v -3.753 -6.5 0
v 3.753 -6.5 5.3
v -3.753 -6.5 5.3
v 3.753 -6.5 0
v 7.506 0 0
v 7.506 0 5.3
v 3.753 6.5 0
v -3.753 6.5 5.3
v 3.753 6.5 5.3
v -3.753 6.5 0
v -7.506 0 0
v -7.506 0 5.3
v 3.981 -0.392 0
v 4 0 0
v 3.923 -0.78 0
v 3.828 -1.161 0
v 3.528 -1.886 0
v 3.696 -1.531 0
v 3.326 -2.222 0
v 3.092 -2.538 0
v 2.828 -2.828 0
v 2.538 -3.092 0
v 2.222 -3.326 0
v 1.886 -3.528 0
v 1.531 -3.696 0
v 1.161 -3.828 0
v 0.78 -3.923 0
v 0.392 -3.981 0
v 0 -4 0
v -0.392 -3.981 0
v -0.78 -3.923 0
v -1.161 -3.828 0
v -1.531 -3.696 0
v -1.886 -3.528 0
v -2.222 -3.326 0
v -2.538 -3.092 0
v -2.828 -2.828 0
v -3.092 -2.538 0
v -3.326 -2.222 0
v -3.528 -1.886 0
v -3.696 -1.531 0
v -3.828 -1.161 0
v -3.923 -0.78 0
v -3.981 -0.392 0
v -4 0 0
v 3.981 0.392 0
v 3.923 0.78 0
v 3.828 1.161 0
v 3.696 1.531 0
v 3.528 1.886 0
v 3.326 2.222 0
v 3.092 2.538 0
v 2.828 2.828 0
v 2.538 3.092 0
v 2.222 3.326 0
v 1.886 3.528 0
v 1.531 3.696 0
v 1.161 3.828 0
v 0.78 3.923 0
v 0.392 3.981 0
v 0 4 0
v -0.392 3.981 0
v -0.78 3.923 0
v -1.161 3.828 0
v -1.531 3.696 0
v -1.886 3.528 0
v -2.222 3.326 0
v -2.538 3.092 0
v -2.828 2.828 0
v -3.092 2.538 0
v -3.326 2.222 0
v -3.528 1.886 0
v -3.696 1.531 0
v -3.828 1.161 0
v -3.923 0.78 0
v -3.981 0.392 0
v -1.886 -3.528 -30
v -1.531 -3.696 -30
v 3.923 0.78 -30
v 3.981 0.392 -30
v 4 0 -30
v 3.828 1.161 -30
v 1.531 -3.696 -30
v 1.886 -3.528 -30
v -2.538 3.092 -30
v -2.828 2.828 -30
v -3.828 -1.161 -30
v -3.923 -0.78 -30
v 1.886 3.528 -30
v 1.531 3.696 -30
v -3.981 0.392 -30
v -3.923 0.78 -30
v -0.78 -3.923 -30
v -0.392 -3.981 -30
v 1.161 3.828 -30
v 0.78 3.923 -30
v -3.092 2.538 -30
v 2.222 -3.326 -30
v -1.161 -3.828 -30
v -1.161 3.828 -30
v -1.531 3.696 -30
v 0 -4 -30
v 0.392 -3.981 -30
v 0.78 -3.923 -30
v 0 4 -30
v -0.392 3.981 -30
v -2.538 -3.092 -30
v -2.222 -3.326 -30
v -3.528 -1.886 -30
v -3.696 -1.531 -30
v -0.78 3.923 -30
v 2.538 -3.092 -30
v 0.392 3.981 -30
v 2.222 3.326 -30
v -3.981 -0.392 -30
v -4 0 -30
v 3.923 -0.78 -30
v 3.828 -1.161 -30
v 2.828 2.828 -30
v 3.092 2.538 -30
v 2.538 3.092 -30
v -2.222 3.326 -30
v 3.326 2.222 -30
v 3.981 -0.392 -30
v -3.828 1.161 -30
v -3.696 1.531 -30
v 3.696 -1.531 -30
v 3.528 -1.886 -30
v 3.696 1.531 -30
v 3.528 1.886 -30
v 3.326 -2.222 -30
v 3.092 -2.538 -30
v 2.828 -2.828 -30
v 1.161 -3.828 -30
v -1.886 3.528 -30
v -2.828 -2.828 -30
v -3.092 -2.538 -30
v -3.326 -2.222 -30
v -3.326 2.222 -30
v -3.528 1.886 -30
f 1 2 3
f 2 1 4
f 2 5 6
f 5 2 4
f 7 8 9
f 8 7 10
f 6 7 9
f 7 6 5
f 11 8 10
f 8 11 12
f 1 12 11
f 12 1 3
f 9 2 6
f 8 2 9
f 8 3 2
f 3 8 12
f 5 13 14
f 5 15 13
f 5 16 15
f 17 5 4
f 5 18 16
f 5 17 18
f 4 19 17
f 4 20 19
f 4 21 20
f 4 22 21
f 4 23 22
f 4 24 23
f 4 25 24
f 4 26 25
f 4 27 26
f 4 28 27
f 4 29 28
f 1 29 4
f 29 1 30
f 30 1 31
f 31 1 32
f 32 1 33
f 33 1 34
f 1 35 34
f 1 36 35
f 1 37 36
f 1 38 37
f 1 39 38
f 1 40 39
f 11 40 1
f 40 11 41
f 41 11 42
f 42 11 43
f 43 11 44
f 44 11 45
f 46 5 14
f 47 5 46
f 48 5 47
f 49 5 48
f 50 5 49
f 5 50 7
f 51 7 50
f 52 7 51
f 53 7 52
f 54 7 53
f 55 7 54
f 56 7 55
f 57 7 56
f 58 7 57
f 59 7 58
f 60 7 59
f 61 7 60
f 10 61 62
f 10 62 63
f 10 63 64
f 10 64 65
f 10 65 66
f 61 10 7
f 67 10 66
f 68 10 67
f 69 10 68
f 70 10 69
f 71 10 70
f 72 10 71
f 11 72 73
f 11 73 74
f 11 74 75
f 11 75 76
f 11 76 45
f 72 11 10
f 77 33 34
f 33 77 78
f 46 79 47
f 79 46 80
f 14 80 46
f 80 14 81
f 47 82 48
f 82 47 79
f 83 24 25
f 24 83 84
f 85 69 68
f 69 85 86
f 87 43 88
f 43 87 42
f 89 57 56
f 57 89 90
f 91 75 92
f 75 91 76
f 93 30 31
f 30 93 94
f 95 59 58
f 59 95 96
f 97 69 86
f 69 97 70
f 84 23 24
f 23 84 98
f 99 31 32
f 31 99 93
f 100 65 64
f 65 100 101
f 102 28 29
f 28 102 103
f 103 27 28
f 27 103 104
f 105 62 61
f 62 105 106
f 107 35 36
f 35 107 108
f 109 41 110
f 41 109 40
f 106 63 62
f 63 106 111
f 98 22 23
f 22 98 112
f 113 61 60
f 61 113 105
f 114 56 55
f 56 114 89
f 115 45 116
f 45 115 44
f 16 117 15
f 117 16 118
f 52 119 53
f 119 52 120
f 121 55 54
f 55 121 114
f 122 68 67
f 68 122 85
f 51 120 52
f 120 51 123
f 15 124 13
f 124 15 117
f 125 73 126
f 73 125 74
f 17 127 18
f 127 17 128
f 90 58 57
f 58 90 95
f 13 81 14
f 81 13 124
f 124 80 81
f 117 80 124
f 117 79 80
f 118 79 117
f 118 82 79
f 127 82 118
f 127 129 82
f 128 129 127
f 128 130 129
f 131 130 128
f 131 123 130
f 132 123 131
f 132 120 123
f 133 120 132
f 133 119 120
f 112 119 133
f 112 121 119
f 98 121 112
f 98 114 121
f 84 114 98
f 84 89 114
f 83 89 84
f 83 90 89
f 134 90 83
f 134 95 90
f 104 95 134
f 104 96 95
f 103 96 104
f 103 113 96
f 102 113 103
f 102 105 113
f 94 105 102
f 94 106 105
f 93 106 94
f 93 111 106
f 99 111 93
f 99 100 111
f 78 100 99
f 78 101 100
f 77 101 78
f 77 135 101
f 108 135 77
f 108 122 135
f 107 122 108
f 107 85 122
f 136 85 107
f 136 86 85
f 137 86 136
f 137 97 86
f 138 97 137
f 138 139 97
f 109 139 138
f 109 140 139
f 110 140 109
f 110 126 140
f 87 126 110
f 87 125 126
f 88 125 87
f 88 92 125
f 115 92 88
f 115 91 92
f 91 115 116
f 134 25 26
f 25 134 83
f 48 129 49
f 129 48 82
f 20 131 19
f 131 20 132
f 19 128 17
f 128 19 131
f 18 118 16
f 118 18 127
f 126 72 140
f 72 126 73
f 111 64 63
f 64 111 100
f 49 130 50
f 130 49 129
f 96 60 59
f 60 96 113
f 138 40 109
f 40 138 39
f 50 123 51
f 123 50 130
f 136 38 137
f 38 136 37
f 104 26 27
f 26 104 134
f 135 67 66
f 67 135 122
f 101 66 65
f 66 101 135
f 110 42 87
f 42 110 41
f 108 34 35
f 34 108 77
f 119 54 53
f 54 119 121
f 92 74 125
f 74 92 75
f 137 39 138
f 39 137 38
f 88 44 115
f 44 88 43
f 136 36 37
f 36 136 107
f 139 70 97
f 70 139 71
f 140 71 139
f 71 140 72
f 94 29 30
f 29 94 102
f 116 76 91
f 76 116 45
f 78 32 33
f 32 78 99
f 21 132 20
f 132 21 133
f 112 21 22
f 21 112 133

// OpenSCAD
// M8 六角ボルト(ねじ山省略・簡易形状)

// パラメータ
af      = 13;    // 頭部 対辺距離 (across-flats) [mm]
head_h  = 5.3;   // 頭部 高さ [mm]
shank_d = 8;     // シャンク直径 [mm]
shank_l = 30;    // シャンク長さ [mm]

$fn = 64;        // 円柱の滑らかさ

module m8_hex_bolt() {
    // 頭部:六角柱(底面が z=0、上方向へ)
    // $fn=6 の cylinder は頂点が半径 r 上に来るため、
    // 対辺距離 af に合わせるには r = (af/2) / cos(30°)
    cylinder(h = head_h, r = (af / 2) / cos(30), $fn = 6);

    // シャンク:円柱(z=0 から z<0 側へ伸びる)
    translate([0, 0, -shank_l])
        cylinder(h = shank_l, d = shank_d);
}

m8_hex_bolt();
